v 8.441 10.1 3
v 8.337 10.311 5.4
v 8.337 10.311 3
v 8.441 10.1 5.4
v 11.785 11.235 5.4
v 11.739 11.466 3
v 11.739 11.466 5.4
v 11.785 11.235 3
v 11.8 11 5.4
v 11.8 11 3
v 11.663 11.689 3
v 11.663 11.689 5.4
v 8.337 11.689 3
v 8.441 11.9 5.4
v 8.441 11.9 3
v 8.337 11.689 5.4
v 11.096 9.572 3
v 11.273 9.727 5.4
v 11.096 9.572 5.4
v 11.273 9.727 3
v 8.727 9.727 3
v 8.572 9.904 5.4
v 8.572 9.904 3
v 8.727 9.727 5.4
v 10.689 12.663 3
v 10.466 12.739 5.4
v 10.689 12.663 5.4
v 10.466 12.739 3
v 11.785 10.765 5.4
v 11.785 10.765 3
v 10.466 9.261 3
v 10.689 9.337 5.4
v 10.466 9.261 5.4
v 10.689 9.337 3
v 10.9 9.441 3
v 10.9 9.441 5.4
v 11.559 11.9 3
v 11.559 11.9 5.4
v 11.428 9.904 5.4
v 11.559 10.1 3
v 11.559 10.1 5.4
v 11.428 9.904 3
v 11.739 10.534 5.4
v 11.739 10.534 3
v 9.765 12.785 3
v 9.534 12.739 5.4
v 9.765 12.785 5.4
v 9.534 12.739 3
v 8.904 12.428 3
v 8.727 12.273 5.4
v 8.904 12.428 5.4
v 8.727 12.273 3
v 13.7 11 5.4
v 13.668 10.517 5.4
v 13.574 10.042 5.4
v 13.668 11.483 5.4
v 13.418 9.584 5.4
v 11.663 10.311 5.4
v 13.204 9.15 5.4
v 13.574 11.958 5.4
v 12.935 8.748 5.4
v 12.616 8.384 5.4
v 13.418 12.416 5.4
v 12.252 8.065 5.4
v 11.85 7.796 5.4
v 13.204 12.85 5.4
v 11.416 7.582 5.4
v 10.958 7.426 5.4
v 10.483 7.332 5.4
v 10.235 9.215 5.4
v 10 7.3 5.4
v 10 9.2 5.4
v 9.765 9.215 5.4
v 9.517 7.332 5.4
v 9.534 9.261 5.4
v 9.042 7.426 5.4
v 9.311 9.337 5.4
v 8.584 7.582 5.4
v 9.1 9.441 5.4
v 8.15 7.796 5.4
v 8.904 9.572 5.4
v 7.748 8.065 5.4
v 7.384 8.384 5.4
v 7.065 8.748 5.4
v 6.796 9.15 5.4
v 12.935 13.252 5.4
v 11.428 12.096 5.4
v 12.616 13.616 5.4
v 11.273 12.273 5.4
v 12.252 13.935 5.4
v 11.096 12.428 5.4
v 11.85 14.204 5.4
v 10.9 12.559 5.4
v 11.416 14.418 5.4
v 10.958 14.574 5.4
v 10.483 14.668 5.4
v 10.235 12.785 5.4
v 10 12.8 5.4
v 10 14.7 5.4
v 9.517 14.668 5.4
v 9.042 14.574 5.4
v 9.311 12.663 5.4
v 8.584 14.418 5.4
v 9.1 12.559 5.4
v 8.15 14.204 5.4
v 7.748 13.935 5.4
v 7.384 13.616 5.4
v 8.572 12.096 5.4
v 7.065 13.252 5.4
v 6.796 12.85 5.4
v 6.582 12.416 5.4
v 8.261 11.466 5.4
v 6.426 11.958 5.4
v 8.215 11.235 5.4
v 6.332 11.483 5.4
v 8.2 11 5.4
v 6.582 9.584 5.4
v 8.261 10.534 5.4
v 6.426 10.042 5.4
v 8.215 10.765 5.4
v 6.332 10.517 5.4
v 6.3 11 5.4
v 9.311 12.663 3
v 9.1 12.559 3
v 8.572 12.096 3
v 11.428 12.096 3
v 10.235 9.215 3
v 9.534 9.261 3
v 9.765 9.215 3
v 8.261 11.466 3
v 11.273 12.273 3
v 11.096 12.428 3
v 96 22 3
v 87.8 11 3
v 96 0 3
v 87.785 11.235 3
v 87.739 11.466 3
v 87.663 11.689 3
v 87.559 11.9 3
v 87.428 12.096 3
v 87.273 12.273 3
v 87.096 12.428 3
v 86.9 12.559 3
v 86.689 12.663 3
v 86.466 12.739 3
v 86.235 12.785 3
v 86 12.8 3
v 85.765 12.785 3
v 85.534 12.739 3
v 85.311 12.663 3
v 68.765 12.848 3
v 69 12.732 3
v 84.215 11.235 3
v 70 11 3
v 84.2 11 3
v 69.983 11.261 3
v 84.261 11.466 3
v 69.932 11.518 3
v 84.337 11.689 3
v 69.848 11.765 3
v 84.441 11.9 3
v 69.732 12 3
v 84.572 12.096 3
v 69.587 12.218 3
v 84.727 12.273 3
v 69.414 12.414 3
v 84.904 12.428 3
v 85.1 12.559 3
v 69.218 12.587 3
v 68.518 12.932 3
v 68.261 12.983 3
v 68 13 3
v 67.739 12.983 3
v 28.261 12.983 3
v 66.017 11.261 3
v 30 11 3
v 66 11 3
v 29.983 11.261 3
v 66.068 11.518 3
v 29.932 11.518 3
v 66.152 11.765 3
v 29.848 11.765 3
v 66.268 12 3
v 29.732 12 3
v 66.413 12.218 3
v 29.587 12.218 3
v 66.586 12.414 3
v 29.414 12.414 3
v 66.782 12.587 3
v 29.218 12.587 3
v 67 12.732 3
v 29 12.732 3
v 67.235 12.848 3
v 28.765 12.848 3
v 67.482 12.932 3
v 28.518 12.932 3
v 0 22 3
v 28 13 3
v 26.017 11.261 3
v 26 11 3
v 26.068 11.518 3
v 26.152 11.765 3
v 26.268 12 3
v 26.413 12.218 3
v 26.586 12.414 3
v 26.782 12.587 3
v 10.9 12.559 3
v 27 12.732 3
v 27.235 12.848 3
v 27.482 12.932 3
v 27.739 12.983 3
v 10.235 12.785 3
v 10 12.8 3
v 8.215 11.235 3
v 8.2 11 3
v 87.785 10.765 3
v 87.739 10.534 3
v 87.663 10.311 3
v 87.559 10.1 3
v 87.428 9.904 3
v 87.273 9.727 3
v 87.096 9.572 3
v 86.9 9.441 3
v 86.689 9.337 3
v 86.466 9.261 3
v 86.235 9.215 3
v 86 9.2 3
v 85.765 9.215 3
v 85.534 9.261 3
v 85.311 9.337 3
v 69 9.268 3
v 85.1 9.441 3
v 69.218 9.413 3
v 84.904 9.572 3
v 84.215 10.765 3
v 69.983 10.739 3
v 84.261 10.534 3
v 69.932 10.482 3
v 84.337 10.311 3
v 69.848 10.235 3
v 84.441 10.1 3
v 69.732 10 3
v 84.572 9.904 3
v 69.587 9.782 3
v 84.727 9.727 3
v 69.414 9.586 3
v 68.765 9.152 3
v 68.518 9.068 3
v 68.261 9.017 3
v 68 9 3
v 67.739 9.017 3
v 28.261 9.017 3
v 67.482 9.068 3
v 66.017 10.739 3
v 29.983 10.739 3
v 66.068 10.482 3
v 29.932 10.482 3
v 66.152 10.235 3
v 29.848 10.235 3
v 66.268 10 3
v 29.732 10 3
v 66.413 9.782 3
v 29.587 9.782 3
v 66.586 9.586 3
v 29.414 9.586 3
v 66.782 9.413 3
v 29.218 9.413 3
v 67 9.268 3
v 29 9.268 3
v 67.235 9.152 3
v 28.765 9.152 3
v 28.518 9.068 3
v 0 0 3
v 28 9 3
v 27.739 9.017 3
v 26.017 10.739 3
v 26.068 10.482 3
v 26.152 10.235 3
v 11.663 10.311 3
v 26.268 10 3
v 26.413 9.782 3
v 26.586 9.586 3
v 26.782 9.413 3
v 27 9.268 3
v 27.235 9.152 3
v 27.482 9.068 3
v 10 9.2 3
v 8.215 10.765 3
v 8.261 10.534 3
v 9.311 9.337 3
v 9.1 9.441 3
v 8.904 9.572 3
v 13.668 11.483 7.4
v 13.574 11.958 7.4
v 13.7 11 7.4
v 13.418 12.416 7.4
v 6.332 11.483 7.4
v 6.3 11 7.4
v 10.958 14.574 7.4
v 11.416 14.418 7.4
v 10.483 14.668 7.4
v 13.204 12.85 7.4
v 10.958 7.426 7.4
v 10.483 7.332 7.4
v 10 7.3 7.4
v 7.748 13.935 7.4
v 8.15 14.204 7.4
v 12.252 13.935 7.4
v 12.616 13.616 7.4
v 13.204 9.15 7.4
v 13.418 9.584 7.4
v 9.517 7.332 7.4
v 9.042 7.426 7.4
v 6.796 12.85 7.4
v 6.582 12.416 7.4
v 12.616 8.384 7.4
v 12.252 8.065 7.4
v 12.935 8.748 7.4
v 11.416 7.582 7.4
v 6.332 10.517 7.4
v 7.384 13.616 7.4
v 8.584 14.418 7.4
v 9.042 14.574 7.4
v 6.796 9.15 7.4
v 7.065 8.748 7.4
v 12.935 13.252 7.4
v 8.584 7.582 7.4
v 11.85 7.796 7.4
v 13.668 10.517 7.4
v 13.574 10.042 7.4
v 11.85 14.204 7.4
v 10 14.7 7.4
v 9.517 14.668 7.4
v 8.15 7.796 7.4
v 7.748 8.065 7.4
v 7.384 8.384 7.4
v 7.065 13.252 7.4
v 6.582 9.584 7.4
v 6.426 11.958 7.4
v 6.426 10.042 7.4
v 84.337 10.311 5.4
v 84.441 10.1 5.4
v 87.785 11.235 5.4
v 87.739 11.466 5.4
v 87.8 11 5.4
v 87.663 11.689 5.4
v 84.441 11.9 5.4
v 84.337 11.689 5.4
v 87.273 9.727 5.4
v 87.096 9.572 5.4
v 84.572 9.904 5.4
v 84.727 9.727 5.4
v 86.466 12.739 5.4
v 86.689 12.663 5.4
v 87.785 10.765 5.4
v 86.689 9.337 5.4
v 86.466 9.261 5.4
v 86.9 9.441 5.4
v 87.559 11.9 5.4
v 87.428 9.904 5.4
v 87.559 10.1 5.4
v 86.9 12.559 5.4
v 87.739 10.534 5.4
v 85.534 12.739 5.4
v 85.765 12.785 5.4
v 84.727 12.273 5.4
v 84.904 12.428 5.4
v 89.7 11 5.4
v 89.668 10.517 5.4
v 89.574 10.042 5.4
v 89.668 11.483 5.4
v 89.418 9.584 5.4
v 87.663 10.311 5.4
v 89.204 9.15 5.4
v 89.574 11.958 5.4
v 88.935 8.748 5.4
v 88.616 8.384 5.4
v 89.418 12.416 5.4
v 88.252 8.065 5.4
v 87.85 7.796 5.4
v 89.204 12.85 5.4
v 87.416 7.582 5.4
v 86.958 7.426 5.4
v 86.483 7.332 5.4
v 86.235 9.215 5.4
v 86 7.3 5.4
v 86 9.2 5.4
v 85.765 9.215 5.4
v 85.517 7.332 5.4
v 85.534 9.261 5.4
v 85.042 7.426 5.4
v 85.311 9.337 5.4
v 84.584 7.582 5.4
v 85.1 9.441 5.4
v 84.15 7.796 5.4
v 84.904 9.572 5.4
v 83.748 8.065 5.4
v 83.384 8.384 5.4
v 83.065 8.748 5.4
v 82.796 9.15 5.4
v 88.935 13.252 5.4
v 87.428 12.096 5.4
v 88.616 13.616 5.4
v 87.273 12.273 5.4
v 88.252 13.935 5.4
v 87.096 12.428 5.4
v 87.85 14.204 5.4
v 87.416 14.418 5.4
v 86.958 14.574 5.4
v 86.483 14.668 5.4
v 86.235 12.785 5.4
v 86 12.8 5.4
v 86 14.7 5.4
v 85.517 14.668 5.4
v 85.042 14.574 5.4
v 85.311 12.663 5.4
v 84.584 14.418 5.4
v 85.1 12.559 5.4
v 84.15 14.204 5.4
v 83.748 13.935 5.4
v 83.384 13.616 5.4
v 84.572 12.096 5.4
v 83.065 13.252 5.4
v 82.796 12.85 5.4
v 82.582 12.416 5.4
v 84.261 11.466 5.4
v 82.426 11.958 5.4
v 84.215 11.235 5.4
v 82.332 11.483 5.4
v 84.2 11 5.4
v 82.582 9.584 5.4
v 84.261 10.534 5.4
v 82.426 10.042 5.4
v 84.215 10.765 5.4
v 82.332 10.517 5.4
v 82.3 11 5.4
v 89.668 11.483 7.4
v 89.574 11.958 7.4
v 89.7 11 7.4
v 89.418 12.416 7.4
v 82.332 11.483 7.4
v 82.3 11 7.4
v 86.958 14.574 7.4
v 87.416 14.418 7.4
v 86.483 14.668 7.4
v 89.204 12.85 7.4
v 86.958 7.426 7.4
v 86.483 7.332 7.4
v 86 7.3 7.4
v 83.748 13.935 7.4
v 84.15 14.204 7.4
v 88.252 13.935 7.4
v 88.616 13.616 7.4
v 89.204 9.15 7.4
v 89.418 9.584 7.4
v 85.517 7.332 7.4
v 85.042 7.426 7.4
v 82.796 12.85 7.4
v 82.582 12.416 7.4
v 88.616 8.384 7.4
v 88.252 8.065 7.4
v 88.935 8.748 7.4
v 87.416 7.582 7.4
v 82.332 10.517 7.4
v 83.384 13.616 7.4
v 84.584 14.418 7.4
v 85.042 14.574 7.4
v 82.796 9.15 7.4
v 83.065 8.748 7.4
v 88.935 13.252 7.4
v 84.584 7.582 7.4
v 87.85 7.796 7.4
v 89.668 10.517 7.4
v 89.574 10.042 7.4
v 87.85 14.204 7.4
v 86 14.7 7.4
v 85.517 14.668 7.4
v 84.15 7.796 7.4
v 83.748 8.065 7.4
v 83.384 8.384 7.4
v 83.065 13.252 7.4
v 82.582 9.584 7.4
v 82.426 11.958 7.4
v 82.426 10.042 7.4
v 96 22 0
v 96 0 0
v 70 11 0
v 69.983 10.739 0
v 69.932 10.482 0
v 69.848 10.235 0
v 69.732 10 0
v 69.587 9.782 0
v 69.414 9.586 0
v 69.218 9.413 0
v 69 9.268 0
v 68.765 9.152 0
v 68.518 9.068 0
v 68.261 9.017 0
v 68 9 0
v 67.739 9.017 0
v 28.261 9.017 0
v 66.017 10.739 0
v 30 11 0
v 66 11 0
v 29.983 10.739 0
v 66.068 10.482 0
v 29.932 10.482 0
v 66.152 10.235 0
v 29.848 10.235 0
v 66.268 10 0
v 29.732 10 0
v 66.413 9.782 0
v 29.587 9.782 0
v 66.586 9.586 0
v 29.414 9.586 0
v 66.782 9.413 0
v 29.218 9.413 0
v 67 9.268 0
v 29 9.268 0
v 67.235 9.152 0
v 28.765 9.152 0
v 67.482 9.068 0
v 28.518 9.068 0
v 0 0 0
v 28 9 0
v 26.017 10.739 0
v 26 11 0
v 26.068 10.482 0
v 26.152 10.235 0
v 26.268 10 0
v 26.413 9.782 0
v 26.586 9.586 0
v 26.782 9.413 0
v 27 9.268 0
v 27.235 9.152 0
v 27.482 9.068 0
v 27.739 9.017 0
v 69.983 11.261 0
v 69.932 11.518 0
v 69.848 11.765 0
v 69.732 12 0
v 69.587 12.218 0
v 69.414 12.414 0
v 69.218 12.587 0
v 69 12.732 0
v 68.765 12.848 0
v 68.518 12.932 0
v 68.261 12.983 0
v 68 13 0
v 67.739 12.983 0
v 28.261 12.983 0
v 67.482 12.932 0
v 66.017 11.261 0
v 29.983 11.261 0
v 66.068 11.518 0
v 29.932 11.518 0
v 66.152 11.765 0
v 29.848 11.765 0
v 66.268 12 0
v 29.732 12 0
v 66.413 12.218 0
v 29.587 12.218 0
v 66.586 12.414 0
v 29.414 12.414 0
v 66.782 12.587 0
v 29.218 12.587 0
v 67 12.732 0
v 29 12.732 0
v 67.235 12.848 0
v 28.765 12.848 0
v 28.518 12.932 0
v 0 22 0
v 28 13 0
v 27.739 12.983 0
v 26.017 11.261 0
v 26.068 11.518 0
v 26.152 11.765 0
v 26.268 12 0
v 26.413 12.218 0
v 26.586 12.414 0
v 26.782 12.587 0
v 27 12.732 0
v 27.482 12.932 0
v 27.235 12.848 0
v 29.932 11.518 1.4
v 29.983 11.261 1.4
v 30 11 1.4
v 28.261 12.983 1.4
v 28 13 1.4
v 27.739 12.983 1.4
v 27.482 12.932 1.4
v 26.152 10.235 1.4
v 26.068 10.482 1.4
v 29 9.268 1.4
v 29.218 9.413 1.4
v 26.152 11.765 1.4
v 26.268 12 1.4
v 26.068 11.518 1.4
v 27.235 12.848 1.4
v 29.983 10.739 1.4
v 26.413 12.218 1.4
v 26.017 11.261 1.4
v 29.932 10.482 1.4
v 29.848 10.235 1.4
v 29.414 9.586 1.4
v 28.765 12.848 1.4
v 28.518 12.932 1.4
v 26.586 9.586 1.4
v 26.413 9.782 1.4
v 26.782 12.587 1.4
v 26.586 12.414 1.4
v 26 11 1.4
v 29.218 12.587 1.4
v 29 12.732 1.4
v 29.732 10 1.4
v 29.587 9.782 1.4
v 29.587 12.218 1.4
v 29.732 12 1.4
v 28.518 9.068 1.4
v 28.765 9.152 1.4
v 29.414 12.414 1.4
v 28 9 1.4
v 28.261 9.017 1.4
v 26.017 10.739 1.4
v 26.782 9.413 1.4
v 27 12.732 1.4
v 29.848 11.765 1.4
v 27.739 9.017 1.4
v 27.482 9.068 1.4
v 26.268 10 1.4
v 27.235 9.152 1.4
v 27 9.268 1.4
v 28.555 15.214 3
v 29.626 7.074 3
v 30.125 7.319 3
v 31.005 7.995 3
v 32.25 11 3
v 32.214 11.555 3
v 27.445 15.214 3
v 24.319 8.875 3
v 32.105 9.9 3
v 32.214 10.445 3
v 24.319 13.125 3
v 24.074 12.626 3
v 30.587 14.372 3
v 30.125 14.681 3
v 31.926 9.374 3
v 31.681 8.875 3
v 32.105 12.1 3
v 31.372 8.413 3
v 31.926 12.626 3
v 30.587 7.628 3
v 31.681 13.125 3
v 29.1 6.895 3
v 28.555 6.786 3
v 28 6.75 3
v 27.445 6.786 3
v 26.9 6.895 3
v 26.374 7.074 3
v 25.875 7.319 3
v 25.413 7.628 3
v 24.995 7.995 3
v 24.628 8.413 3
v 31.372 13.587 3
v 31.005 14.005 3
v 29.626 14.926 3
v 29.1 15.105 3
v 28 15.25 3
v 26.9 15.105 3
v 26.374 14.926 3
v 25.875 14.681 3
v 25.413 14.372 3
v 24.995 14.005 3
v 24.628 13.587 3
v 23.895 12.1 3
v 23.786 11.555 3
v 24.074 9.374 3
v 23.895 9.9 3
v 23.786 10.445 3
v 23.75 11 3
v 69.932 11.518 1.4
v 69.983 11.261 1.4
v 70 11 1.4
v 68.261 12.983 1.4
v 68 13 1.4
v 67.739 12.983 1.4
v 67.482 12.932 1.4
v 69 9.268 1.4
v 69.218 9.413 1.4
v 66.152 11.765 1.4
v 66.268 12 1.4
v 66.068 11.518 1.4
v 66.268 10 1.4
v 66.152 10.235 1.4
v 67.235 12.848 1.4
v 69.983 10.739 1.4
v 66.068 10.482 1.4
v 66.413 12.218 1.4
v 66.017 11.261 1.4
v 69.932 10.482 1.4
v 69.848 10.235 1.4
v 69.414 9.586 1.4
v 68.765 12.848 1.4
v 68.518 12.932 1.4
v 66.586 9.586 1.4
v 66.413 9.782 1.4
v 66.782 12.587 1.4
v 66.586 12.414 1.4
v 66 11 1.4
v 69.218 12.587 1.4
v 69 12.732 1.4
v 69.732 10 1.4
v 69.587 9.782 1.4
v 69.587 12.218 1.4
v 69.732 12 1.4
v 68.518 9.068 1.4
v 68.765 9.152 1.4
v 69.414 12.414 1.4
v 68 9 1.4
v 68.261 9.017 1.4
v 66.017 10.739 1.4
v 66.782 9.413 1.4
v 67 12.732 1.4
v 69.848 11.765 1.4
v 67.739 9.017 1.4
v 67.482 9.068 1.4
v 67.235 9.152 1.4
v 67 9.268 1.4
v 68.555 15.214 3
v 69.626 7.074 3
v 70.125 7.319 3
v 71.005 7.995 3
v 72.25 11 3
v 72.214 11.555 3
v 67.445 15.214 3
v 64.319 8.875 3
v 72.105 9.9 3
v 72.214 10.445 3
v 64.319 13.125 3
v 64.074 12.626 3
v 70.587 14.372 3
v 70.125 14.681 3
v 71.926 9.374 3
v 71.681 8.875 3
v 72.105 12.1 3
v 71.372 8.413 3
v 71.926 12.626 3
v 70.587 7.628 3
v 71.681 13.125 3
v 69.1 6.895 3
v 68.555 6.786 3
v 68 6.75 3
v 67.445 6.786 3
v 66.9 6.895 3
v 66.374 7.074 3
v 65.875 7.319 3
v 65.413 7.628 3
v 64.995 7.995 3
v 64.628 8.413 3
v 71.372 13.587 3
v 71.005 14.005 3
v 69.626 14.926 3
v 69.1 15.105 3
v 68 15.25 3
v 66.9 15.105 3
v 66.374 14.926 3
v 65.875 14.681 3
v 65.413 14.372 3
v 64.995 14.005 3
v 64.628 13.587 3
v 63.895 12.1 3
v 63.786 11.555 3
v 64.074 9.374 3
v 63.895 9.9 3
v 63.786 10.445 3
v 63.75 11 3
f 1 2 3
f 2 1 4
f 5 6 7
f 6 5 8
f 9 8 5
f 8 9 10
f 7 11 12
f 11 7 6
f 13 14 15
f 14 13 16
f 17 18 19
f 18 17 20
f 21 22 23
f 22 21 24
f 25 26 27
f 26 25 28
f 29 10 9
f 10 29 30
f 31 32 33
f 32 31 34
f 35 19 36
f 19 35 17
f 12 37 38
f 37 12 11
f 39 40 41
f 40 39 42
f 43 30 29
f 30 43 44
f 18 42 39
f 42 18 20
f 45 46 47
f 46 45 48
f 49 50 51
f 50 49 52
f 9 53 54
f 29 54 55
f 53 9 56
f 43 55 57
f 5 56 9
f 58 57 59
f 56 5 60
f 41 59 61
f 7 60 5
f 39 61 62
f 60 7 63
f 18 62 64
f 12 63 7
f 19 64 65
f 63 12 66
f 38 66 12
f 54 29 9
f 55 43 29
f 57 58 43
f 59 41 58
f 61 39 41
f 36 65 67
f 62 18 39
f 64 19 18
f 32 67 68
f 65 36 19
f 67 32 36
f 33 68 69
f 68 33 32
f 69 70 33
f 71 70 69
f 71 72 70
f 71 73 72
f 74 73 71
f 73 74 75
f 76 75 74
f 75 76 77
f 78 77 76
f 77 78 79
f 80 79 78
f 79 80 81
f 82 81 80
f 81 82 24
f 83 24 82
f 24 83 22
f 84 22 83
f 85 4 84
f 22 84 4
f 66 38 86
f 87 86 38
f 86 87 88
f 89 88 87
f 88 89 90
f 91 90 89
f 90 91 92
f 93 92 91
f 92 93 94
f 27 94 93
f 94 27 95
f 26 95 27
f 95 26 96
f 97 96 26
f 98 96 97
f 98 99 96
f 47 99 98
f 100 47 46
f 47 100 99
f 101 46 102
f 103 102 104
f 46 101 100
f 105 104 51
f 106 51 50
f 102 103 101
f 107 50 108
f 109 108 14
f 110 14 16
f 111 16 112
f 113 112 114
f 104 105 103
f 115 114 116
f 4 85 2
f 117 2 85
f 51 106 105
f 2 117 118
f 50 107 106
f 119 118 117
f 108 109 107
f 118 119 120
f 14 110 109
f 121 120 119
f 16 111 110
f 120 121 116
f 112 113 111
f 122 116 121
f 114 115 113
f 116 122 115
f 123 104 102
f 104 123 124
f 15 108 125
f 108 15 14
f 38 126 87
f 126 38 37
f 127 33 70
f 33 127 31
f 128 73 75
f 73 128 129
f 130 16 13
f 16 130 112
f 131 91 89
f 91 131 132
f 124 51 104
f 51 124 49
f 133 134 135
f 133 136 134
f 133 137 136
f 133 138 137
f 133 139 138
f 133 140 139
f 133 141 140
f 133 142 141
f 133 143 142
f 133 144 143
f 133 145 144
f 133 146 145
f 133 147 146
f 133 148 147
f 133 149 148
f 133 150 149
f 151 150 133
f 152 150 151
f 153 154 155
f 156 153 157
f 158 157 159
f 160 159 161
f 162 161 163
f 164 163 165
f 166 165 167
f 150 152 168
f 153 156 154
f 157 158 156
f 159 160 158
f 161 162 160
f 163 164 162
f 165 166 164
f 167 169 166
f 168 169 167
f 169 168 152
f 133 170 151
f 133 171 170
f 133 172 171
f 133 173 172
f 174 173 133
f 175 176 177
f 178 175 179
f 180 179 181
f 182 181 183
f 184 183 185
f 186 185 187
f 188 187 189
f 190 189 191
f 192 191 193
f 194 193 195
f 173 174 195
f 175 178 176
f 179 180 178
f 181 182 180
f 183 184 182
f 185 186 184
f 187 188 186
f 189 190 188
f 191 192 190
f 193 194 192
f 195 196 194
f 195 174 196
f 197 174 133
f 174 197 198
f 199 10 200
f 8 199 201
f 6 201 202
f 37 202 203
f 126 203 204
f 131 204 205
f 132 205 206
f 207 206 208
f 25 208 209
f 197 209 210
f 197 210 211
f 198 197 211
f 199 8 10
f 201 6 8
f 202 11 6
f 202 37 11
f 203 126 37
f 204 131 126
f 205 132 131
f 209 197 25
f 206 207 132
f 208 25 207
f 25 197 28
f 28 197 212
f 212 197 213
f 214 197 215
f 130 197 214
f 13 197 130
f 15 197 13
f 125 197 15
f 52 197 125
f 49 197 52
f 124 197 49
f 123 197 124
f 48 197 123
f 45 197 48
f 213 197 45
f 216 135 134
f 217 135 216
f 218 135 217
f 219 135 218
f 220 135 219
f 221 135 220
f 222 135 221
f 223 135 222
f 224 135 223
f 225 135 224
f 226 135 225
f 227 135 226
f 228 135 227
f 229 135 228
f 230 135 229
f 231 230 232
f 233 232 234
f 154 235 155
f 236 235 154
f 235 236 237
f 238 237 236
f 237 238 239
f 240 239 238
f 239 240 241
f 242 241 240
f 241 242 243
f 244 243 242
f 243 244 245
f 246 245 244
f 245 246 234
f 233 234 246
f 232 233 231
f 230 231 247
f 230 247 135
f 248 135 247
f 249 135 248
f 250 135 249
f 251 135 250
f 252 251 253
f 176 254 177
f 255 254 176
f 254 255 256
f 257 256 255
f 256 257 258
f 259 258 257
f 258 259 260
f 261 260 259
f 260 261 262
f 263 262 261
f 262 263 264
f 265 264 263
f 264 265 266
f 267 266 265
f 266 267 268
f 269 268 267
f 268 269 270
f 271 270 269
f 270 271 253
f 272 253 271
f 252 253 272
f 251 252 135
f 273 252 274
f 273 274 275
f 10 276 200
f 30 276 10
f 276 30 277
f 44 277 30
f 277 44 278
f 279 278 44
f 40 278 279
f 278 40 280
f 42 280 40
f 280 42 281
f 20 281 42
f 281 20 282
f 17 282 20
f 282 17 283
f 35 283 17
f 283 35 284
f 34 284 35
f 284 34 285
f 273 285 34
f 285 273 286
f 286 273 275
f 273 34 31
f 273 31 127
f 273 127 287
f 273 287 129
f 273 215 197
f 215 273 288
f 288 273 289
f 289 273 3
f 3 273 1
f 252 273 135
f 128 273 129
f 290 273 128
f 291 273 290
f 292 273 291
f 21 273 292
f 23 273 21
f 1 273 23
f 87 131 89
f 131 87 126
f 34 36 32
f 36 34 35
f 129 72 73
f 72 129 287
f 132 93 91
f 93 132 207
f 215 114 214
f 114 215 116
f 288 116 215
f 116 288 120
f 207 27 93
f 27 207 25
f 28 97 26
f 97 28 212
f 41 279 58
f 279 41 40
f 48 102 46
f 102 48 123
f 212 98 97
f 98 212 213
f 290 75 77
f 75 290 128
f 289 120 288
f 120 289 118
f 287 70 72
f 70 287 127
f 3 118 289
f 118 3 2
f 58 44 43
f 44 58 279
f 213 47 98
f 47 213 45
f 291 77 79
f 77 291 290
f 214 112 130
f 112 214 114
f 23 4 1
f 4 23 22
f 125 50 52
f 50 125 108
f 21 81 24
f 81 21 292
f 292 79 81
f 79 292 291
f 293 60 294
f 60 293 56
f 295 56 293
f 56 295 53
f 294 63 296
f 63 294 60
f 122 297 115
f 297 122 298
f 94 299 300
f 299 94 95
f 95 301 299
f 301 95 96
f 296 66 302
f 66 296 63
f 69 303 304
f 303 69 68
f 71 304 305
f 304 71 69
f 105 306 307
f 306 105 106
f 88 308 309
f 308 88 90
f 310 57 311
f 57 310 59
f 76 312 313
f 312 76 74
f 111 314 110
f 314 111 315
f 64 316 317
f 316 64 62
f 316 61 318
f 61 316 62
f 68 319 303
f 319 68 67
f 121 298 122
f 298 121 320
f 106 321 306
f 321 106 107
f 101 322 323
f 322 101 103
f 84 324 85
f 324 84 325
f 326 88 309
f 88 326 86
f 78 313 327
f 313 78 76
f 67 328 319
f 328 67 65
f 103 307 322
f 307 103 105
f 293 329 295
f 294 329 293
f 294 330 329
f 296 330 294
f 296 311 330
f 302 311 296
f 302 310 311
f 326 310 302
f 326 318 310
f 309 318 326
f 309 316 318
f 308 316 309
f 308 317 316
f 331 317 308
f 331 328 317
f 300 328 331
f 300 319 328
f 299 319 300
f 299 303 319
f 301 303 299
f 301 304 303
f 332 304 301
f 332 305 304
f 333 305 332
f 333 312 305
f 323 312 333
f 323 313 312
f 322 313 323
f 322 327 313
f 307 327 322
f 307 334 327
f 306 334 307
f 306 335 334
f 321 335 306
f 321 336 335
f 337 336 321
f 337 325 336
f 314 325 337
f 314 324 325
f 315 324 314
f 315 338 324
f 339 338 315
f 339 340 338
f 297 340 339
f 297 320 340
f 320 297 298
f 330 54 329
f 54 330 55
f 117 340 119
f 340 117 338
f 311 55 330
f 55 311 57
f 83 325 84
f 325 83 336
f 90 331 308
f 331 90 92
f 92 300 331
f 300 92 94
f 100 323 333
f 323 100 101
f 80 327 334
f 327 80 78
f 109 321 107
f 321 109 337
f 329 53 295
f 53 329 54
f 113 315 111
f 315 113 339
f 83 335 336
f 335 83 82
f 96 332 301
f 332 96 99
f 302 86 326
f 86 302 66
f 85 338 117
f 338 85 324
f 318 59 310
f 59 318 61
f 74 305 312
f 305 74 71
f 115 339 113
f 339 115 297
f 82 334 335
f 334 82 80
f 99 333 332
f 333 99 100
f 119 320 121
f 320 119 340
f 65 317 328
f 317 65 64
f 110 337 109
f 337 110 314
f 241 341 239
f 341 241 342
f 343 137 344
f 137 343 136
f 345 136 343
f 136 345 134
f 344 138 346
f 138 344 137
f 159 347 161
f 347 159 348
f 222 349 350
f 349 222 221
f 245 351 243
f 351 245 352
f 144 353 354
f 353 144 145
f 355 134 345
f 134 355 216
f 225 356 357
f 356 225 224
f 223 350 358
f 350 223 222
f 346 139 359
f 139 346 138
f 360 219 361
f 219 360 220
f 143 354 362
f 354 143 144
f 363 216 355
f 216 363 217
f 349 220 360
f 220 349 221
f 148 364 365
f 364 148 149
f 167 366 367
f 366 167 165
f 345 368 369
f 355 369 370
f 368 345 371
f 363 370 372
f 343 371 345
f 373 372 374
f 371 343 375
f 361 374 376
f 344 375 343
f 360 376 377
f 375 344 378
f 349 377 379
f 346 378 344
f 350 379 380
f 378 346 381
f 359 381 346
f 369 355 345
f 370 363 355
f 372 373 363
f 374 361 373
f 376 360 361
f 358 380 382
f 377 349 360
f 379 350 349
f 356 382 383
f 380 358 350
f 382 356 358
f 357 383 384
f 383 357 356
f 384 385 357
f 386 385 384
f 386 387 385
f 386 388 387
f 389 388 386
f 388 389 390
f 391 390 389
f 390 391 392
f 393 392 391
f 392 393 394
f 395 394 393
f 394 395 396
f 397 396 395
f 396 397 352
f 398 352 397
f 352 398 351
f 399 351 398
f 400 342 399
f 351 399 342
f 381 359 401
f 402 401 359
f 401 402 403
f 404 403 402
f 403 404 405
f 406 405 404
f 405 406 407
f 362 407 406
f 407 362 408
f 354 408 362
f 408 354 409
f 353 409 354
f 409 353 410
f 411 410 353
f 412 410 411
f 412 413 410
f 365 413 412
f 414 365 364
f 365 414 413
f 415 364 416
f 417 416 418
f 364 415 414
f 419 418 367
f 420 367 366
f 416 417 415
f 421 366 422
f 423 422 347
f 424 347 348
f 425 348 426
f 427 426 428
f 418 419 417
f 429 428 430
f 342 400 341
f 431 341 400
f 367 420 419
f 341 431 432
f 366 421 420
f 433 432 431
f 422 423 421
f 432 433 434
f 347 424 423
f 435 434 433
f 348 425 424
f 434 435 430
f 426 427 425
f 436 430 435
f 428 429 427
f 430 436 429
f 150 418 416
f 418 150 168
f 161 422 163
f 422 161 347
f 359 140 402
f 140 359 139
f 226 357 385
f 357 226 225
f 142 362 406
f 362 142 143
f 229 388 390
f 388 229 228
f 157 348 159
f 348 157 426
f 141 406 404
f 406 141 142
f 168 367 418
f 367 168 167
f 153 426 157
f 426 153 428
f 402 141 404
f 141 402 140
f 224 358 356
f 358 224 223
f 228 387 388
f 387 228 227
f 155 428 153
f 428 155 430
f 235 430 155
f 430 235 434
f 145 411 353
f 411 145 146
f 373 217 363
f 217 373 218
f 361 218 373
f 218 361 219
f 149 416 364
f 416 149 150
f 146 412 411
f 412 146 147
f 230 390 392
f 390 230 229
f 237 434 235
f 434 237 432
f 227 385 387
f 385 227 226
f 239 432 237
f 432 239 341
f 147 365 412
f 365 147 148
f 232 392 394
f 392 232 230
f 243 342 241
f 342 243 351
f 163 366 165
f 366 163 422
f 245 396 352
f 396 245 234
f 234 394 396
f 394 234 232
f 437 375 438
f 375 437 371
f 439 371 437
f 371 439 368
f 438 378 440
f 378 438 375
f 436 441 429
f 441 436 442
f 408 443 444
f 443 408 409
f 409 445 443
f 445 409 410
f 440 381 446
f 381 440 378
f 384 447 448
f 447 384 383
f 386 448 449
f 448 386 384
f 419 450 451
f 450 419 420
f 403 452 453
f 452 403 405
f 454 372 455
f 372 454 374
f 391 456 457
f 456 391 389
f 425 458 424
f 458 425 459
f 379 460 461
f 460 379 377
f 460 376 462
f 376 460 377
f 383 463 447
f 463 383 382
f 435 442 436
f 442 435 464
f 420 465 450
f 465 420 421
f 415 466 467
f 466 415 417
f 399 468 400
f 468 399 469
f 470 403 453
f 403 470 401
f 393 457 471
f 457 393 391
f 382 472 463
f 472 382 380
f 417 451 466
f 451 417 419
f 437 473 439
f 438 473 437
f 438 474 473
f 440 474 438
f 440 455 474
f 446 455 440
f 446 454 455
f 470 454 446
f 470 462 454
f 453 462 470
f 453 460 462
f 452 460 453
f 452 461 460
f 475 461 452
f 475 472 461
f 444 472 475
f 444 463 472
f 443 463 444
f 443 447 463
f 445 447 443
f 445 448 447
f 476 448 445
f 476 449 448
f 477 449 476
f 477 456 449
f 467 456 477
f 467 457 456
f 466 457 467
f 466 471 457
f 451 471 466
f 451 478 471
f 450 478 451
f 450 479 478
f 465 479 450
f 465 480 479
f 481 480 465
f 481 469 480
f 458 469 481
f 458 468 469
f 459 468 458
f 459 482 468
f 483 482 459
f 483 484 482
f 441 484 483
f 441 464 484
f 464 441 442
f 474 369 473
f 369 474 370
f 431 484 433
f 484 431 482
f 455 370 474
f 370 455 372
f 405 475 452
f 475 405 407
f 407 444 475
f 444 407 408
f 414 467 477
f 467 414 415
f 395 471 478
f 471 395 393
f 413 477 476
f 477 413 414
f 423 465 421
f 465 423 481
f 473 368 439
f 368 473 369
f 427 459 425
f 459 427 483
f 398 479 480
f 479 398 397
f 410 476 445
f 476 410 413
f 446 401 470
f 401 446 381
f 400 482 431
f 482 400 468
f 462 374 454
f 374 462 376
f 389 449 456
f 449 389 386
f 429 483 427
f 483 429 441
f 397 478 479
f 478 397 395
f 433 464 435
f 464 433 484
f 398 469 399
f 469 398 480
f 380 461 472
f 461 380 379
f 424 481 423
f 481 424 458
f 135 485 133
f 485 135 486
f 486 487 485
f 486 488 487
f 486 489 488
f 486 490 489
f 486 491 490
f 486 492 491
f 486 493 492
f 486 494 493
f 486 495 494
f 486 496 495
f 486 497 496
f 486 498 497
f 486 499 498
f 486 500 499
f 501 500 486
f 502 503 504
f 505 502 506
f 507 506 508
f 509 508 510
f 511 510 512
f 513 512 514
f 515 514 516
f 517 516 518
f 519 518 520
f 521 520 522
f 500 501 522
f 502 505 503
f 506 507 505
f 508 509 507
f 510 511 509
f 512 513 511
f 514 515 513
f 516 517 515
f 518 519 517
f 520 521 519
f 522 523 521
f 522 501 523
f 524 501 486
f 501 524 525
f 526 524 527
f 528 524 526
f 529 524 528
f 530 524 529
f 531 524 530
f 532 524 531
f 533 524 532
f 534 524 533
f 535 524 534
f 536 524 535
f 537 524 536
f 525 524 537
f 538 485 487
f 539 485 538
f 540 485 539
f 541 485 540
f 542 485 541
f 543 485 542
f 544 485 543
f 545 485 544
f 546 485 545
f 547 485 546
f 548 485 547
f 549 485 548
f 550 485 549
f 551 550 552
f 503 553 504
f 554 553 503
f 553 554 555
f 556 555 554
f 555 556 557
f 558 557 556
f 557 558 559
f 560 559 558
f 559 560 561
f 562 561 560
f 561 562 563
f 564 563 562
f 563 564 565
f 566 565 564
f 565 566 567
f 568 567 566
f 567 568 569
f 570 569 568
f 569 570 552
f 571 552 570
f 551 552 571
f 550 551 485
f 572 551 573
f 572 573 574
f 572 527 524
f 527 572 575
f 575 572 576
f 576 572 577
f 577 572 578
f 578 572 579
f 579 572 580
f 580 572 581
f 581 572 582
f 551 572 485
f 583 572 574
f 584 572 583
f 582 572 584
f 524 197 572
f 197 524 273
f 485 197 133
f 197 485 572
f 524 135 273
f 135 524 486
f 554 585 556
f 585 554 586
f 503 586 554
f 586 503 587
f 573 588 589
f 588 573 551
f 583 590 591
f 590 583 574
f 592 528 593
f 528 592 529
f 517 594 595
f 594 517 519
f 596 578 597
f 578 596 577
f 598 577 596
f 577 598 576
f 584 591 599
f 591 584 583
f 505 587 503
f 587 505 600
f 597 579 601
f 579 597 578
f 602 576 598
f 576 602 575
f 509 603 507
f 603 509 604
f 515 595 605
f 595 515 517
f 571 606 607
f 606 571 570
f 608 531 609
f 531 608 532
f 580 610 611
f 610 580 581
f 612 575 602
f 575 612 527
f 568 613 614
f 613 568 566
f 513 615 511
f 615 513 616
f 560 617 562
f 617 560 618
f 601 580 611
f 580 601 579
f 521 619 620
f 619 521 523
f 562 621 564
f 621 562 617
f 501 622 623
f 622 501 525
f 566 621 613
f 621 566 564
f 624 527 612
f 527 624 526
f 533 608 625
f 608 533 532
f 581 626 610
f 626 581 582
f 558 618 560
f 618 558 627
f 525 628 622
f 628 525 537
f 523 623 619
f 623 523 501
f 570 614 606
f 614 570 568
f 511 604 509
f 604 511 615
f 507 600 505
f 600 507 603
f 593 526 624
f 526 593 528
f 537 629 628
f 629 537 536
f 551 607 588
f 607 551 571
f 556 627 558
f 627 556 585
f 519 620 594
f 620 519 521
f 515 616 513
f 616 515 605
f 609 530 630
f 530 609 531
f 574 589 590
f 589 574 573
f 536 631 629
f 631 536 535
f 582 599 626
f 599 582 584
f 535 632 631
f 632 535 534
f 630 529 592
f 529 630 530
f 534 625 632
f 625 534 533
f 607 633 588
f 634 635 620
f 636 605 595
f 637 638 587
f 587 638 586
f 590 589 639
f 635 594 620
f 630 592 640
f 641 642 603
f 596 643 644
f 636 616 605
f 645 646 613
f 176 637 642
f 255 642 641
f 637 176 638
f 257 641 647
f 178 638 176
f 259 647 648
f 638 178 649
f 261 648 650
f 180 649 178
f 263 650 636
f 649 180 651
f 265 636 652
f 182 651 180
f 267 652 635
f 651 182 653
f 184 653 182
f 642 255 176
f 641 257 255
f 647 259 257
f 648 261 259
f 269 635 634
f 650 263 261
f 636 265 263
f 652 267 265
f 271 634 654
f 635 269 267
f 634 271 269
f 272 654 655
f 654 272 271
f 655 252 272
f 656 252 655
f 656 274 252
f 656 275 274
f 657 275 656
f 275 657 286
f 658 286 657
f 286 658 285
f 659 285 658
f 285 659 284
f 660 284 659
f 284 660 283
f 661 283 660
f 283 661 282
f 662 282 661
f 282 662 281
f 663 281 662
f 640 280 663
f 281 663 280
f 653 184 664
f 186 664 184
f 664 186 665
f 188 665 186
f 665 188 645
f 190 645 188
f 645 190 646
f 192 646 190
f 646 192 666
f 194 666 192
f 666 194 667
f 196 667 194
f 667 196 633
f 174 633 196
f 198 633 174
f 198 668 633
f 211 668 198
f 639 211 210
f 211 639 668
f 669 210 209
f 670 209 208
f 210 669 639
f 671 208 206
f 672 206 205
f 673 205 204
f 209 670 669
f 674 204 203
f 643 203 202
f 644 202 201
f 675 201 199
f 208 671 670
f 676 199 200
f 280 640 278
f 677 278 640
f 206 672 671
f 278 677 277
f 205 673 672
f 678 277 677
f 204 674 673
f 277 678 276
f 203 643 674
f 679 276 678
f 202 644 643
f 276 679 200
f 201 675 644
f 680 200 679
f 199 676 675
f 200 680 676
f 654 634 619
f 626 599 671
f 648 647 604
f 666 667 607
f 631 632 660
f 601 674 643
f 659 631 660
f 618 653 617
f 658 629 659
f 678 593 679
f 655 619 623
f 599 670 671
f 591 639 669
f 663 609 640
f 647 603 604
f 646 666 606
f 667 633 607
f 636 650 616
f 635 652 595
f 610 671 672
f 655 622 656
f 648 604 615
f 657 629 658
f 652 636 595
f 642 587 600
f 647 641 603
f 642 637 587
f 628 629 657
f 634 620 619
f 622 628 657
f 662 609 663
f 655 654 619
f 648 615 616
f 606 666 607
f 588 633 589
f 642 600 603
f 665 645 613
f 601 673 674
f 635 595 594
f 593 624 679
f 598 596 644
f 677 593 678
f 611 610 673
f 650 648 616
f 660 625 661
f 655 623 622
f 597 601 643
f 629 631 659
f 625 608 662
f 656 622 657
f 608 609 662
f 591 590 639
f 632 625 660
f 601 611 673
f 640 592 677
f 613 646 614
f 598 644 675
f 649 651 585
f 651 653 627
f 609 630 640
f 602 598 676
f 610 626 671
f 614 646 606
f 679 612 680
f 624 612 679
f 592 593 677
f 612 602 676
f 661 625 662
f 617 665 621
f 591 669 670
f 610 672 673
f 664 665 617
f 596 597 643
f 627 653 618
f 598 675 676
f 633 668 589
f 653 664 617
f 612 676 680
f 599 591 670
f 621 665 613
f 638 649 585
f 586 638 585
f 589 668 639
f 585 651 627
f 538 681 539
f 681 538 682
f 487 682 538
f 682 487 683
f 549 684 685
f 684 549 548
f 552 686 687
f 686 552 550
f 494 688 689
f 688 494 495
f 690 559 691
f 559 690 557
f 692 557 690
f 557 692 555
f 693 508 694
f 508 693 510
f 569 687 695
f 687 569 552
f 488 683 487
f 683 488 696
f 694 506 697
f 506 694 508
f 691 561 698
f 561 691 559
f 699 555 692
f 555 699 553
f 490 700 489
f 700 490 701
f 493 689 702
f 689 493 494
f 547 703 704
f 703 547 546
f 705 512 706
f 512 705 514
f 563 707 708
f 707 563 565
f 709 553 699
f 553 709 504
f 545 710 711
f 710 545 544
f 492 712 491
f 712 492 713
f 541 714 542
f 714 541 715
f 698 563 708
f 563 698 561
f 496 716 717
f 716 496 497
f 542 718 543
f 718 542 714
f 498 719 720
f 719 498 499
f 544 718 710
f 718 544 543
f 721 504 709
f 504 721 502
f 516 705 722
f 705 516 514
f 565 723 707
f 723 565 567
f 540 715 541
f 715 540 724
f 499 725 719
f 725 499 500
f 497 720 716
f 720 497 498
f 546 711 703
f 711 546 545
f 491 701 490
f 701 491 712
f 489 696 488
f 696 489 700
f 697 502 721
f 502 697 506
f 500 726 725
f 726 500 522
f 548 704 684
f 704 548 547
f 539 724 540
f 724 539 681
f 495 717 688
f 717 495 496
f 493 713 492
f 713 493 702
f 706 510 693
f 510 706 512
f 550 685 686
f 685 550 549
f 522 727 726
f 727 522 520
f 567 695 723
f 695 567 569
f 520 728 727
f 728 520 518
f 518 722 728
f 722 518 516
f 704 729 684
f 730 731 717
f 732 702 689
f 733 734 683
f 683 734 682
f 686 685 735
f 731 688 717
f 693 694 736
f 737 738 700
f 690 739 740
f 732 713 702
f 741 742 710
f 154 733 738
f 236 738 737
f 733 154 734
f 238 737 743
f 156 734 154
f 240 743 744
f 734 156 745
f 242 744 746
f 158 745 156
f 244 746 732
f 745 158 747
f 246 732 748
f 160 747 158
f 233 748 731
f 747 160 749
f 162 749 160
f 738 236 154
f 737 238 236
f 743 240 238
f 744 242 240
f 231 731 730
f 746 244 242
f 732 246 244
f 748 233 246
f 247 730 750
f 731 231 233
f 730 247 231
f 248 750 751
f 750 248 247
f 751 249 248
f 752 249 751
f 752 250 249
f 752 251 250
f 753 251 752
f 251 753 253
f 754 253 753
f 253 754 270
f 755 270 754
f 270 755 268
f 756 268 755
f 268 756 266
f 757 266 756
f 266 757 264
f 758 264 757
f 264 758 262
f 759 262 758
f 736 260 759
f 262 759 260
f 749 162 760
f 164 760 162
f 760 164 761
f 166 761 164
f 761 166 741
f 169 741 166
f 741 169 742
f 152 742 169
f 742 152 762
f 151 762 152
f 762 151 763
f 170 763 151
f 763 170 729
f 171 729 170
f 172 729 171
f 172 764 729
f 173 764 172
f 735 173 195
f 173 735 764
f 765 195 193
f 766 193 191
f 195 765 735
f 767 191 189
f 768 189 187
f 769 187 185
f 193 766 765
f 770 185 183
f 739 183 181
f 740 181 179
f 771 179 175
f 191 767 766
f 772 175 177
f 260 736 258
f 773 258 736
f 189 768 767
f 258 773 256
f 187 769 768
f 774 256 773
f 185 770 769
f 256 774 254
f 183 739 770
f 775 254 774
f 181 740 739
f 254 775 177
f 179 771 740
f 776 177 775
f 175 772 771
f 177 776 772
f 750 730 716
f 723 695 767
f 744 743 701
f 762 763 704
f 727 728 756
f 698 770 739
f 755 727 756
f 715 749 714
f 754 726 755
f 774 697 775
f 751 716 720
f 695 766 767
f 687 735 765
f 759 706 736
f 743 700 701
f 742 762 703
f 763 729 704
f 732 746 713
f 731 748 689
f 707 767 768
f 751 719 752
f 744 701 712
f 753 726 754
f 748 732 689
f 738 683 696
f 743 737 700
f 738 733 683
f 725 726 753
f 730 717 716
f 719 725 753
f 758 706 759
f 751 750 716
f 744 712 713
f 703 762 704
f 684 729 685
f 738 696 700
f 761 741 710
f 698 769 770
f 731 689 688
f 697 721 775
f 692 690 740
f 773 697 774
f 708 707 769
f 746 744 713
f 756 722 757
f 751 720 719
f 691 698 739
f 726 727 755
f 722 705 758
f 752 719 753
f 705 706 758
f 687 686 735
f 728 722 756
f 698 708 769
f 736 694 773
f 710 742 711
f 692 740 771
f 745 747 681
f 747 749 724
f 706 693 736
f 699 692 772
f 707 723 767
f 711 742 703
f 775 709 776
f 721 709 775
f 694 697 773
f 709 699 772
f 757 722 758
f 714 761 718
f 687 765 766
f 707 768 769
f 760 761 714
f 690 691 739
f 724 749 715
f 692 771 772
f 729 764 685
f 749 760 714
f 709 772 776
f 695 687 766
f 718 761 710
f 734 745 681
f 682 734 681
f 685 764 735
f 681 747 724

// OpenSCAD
// ZEN16 keyhole adapter plate for Carlon E987R 6x6x4 PVC box
// Hangs the ZEN16 on two mushroom studs; the box's back-wall mounting screws
// pass through countersunk holes in this plate (plate is clamped between
// screw heads... no — screws countersink INTO the plate, clamping plate+box
// to the wall; ZEN16 hangs on the studs above them).
//
// ALL DIMENSIONS ARE PLACEHOLDERS — verify with calipers on the actual ZEN16
// before printing. Print flat side down, no supports; PETG or PLA fine.

/* ---------------- measure these ---------------- */
keyhole_spacing   = 76.0;  // ZEN16 keyhole center-to-center, mm (MEASURE!)
slot_width        = 4.0;   // narrow part of keyhole slot -> stud neck dia
entry_hole_dia    = 8.0;   // round part of keyhole -> stud head must be < this
backplate_thick   = 2.0;   // ZEN16 shell thickness at the keyhole
wall_screw_space  = 40.0;  // spacing of the two box-mounting screws, mm
wall_screw_dia    = 4.0;   // #6 screw shank clearance
wall_screw_head   = 8.5;   // #6 pan/flat head dia for countersink

/* ---------------- derived / tunable ---------------- */
plate_len   = keyhole_spacing + 20;
plate_wid   = 22;
plate_thick = 3;
neck_dia    = slot_width - 0.4;      // slides in slot with clearance
neck_len    = backplate_thick + 0.4; // shell thickness + slip clearance
head_dia    = entry_hole_dia - 0.6;  // fits through entry hole
head_thick  = 2.0;

$fn = 48;

difference() {
    union() {
        // plate
        cube([plate_len, plate_wid, plate_thick], center = false);
        // two mushroom studs
        for (x = [plate_len/2 - keyhole_spacing/2,
                  plate_len/2 + keyhole_spacing/2])
            translate([x, plate_wid/2, plate_thick]) {
                cylinder(d = neck_dia, h = neck_len);
                translate([0, 0, neck_len])
                    cylinder(d = head_dia, h = head_thick);
            }
    }
    // countersunk wall-screw holes, centered between the studs
    for (x = [plate_len/2 - wall_screw_space/2,
              plate_len/2 + wall_screw_space/2])
        translate([x, plate_wid/2, -0.1]) {
            cylinder(d = wall_screw_dia, h = plate_thick + 0.2);
            // countersink from the front face
            translate([0, 0, plate_thick - 1.5])
                cylinder(d1 = wall_screw_dia, d2 = wall_screw_head, h = 1.6);
        }
}
